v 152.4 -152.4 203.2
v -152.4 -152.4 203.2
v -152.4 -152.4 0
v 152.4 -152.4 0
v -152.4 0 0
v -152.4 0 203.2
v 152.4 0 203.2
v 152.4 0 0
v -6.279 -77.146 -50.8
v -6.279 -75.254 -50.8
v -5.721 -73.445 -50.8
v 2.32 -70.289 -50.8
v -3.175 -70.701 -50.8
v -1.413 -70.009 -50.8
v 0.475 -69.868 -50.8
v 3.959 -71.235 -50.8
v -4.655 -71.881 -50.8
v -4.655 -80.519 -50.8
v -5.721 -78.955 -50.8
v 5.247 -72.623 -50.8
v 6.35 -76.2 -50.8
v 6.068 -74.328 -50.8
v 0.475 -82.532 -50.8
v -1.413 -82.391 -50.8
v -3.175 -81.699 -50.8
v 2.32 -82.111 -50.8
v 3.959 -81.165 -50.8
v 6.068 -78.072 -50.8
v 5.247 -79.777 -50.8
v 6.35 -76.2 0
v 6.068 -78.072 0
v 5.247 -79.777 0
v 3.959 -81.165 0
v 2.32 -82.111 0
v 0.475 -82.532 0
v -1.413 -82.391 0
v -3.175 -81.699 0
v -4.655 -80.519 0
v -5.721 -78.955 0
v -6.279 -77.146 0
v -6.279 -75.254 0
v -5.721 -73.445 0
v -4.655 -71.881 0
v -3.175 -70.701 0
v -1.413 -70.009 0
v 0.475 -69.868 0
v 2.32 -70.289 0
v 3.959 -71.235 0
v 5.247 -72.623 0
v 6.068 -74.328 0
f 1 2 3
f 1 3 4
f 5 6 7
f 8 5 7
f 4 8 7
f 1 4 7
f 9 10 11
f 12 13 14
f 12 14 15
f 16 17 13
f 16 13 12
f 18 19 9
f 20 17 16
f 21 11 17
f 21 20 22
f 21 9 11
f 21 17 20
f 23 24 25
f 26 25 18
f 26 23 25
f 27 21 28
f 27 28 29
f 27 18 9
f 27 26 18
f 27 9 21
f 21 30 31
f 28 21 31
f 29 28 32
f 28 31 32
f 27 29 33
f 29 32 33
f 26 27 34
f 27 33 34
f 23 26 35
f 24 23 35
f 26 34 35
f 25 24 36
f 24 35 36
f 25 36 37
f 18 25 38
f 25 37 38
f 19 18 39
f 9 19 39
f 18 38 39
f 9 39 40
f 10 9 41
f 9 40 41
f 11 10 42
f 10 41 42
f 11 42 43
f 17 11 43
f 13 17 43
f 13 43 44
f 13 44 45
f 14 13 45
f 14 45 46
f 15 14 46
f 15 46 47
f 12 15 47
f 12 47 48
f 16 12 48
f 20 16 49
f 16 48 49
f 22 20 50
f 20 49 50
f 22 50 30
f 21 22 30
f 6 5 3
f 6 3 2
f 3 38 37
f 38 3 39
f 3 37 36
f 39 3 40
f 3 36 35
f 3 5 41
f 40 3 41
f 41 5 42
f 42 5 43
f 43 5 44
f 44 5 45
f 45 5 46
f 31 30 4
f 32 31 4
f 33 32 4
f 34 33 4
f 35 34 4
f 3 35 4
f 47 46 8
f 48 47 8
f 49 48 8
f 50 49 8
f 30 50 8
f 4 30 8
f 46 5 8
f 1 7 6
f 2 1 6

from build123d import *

# Parameters (mm, degrees)
F0_W     = 152.4
F0_H     = 203.2
F1_DEPTH = 152.4
F2_R     = 6.35
F3_DEPTH = 50.8


with BuildPart() as f1:
    # F0 (on Front) → F1 (new body)
    with BuildSketch(Plane.XZ):
        with Locations((-76.2, 101.6)):
            Rectangle(F0_W, F0_H)
        with Locations((76.2, 101.6)):
            Rectangle(F0_W, F0_H)
    extrude(amount=F1_DEPTH)

    # F2 (on face) → F3 (join)
    with BuildSketch(Plane(origin=(0, 0, 0), x_dir=(1, 0, 0), z_dir=(0, 0, -1))):
        with Locations((0, 76.2)):
            Circle(F2_R)
    extrude(amount=F3_DEPTH)


solid = f1.part
